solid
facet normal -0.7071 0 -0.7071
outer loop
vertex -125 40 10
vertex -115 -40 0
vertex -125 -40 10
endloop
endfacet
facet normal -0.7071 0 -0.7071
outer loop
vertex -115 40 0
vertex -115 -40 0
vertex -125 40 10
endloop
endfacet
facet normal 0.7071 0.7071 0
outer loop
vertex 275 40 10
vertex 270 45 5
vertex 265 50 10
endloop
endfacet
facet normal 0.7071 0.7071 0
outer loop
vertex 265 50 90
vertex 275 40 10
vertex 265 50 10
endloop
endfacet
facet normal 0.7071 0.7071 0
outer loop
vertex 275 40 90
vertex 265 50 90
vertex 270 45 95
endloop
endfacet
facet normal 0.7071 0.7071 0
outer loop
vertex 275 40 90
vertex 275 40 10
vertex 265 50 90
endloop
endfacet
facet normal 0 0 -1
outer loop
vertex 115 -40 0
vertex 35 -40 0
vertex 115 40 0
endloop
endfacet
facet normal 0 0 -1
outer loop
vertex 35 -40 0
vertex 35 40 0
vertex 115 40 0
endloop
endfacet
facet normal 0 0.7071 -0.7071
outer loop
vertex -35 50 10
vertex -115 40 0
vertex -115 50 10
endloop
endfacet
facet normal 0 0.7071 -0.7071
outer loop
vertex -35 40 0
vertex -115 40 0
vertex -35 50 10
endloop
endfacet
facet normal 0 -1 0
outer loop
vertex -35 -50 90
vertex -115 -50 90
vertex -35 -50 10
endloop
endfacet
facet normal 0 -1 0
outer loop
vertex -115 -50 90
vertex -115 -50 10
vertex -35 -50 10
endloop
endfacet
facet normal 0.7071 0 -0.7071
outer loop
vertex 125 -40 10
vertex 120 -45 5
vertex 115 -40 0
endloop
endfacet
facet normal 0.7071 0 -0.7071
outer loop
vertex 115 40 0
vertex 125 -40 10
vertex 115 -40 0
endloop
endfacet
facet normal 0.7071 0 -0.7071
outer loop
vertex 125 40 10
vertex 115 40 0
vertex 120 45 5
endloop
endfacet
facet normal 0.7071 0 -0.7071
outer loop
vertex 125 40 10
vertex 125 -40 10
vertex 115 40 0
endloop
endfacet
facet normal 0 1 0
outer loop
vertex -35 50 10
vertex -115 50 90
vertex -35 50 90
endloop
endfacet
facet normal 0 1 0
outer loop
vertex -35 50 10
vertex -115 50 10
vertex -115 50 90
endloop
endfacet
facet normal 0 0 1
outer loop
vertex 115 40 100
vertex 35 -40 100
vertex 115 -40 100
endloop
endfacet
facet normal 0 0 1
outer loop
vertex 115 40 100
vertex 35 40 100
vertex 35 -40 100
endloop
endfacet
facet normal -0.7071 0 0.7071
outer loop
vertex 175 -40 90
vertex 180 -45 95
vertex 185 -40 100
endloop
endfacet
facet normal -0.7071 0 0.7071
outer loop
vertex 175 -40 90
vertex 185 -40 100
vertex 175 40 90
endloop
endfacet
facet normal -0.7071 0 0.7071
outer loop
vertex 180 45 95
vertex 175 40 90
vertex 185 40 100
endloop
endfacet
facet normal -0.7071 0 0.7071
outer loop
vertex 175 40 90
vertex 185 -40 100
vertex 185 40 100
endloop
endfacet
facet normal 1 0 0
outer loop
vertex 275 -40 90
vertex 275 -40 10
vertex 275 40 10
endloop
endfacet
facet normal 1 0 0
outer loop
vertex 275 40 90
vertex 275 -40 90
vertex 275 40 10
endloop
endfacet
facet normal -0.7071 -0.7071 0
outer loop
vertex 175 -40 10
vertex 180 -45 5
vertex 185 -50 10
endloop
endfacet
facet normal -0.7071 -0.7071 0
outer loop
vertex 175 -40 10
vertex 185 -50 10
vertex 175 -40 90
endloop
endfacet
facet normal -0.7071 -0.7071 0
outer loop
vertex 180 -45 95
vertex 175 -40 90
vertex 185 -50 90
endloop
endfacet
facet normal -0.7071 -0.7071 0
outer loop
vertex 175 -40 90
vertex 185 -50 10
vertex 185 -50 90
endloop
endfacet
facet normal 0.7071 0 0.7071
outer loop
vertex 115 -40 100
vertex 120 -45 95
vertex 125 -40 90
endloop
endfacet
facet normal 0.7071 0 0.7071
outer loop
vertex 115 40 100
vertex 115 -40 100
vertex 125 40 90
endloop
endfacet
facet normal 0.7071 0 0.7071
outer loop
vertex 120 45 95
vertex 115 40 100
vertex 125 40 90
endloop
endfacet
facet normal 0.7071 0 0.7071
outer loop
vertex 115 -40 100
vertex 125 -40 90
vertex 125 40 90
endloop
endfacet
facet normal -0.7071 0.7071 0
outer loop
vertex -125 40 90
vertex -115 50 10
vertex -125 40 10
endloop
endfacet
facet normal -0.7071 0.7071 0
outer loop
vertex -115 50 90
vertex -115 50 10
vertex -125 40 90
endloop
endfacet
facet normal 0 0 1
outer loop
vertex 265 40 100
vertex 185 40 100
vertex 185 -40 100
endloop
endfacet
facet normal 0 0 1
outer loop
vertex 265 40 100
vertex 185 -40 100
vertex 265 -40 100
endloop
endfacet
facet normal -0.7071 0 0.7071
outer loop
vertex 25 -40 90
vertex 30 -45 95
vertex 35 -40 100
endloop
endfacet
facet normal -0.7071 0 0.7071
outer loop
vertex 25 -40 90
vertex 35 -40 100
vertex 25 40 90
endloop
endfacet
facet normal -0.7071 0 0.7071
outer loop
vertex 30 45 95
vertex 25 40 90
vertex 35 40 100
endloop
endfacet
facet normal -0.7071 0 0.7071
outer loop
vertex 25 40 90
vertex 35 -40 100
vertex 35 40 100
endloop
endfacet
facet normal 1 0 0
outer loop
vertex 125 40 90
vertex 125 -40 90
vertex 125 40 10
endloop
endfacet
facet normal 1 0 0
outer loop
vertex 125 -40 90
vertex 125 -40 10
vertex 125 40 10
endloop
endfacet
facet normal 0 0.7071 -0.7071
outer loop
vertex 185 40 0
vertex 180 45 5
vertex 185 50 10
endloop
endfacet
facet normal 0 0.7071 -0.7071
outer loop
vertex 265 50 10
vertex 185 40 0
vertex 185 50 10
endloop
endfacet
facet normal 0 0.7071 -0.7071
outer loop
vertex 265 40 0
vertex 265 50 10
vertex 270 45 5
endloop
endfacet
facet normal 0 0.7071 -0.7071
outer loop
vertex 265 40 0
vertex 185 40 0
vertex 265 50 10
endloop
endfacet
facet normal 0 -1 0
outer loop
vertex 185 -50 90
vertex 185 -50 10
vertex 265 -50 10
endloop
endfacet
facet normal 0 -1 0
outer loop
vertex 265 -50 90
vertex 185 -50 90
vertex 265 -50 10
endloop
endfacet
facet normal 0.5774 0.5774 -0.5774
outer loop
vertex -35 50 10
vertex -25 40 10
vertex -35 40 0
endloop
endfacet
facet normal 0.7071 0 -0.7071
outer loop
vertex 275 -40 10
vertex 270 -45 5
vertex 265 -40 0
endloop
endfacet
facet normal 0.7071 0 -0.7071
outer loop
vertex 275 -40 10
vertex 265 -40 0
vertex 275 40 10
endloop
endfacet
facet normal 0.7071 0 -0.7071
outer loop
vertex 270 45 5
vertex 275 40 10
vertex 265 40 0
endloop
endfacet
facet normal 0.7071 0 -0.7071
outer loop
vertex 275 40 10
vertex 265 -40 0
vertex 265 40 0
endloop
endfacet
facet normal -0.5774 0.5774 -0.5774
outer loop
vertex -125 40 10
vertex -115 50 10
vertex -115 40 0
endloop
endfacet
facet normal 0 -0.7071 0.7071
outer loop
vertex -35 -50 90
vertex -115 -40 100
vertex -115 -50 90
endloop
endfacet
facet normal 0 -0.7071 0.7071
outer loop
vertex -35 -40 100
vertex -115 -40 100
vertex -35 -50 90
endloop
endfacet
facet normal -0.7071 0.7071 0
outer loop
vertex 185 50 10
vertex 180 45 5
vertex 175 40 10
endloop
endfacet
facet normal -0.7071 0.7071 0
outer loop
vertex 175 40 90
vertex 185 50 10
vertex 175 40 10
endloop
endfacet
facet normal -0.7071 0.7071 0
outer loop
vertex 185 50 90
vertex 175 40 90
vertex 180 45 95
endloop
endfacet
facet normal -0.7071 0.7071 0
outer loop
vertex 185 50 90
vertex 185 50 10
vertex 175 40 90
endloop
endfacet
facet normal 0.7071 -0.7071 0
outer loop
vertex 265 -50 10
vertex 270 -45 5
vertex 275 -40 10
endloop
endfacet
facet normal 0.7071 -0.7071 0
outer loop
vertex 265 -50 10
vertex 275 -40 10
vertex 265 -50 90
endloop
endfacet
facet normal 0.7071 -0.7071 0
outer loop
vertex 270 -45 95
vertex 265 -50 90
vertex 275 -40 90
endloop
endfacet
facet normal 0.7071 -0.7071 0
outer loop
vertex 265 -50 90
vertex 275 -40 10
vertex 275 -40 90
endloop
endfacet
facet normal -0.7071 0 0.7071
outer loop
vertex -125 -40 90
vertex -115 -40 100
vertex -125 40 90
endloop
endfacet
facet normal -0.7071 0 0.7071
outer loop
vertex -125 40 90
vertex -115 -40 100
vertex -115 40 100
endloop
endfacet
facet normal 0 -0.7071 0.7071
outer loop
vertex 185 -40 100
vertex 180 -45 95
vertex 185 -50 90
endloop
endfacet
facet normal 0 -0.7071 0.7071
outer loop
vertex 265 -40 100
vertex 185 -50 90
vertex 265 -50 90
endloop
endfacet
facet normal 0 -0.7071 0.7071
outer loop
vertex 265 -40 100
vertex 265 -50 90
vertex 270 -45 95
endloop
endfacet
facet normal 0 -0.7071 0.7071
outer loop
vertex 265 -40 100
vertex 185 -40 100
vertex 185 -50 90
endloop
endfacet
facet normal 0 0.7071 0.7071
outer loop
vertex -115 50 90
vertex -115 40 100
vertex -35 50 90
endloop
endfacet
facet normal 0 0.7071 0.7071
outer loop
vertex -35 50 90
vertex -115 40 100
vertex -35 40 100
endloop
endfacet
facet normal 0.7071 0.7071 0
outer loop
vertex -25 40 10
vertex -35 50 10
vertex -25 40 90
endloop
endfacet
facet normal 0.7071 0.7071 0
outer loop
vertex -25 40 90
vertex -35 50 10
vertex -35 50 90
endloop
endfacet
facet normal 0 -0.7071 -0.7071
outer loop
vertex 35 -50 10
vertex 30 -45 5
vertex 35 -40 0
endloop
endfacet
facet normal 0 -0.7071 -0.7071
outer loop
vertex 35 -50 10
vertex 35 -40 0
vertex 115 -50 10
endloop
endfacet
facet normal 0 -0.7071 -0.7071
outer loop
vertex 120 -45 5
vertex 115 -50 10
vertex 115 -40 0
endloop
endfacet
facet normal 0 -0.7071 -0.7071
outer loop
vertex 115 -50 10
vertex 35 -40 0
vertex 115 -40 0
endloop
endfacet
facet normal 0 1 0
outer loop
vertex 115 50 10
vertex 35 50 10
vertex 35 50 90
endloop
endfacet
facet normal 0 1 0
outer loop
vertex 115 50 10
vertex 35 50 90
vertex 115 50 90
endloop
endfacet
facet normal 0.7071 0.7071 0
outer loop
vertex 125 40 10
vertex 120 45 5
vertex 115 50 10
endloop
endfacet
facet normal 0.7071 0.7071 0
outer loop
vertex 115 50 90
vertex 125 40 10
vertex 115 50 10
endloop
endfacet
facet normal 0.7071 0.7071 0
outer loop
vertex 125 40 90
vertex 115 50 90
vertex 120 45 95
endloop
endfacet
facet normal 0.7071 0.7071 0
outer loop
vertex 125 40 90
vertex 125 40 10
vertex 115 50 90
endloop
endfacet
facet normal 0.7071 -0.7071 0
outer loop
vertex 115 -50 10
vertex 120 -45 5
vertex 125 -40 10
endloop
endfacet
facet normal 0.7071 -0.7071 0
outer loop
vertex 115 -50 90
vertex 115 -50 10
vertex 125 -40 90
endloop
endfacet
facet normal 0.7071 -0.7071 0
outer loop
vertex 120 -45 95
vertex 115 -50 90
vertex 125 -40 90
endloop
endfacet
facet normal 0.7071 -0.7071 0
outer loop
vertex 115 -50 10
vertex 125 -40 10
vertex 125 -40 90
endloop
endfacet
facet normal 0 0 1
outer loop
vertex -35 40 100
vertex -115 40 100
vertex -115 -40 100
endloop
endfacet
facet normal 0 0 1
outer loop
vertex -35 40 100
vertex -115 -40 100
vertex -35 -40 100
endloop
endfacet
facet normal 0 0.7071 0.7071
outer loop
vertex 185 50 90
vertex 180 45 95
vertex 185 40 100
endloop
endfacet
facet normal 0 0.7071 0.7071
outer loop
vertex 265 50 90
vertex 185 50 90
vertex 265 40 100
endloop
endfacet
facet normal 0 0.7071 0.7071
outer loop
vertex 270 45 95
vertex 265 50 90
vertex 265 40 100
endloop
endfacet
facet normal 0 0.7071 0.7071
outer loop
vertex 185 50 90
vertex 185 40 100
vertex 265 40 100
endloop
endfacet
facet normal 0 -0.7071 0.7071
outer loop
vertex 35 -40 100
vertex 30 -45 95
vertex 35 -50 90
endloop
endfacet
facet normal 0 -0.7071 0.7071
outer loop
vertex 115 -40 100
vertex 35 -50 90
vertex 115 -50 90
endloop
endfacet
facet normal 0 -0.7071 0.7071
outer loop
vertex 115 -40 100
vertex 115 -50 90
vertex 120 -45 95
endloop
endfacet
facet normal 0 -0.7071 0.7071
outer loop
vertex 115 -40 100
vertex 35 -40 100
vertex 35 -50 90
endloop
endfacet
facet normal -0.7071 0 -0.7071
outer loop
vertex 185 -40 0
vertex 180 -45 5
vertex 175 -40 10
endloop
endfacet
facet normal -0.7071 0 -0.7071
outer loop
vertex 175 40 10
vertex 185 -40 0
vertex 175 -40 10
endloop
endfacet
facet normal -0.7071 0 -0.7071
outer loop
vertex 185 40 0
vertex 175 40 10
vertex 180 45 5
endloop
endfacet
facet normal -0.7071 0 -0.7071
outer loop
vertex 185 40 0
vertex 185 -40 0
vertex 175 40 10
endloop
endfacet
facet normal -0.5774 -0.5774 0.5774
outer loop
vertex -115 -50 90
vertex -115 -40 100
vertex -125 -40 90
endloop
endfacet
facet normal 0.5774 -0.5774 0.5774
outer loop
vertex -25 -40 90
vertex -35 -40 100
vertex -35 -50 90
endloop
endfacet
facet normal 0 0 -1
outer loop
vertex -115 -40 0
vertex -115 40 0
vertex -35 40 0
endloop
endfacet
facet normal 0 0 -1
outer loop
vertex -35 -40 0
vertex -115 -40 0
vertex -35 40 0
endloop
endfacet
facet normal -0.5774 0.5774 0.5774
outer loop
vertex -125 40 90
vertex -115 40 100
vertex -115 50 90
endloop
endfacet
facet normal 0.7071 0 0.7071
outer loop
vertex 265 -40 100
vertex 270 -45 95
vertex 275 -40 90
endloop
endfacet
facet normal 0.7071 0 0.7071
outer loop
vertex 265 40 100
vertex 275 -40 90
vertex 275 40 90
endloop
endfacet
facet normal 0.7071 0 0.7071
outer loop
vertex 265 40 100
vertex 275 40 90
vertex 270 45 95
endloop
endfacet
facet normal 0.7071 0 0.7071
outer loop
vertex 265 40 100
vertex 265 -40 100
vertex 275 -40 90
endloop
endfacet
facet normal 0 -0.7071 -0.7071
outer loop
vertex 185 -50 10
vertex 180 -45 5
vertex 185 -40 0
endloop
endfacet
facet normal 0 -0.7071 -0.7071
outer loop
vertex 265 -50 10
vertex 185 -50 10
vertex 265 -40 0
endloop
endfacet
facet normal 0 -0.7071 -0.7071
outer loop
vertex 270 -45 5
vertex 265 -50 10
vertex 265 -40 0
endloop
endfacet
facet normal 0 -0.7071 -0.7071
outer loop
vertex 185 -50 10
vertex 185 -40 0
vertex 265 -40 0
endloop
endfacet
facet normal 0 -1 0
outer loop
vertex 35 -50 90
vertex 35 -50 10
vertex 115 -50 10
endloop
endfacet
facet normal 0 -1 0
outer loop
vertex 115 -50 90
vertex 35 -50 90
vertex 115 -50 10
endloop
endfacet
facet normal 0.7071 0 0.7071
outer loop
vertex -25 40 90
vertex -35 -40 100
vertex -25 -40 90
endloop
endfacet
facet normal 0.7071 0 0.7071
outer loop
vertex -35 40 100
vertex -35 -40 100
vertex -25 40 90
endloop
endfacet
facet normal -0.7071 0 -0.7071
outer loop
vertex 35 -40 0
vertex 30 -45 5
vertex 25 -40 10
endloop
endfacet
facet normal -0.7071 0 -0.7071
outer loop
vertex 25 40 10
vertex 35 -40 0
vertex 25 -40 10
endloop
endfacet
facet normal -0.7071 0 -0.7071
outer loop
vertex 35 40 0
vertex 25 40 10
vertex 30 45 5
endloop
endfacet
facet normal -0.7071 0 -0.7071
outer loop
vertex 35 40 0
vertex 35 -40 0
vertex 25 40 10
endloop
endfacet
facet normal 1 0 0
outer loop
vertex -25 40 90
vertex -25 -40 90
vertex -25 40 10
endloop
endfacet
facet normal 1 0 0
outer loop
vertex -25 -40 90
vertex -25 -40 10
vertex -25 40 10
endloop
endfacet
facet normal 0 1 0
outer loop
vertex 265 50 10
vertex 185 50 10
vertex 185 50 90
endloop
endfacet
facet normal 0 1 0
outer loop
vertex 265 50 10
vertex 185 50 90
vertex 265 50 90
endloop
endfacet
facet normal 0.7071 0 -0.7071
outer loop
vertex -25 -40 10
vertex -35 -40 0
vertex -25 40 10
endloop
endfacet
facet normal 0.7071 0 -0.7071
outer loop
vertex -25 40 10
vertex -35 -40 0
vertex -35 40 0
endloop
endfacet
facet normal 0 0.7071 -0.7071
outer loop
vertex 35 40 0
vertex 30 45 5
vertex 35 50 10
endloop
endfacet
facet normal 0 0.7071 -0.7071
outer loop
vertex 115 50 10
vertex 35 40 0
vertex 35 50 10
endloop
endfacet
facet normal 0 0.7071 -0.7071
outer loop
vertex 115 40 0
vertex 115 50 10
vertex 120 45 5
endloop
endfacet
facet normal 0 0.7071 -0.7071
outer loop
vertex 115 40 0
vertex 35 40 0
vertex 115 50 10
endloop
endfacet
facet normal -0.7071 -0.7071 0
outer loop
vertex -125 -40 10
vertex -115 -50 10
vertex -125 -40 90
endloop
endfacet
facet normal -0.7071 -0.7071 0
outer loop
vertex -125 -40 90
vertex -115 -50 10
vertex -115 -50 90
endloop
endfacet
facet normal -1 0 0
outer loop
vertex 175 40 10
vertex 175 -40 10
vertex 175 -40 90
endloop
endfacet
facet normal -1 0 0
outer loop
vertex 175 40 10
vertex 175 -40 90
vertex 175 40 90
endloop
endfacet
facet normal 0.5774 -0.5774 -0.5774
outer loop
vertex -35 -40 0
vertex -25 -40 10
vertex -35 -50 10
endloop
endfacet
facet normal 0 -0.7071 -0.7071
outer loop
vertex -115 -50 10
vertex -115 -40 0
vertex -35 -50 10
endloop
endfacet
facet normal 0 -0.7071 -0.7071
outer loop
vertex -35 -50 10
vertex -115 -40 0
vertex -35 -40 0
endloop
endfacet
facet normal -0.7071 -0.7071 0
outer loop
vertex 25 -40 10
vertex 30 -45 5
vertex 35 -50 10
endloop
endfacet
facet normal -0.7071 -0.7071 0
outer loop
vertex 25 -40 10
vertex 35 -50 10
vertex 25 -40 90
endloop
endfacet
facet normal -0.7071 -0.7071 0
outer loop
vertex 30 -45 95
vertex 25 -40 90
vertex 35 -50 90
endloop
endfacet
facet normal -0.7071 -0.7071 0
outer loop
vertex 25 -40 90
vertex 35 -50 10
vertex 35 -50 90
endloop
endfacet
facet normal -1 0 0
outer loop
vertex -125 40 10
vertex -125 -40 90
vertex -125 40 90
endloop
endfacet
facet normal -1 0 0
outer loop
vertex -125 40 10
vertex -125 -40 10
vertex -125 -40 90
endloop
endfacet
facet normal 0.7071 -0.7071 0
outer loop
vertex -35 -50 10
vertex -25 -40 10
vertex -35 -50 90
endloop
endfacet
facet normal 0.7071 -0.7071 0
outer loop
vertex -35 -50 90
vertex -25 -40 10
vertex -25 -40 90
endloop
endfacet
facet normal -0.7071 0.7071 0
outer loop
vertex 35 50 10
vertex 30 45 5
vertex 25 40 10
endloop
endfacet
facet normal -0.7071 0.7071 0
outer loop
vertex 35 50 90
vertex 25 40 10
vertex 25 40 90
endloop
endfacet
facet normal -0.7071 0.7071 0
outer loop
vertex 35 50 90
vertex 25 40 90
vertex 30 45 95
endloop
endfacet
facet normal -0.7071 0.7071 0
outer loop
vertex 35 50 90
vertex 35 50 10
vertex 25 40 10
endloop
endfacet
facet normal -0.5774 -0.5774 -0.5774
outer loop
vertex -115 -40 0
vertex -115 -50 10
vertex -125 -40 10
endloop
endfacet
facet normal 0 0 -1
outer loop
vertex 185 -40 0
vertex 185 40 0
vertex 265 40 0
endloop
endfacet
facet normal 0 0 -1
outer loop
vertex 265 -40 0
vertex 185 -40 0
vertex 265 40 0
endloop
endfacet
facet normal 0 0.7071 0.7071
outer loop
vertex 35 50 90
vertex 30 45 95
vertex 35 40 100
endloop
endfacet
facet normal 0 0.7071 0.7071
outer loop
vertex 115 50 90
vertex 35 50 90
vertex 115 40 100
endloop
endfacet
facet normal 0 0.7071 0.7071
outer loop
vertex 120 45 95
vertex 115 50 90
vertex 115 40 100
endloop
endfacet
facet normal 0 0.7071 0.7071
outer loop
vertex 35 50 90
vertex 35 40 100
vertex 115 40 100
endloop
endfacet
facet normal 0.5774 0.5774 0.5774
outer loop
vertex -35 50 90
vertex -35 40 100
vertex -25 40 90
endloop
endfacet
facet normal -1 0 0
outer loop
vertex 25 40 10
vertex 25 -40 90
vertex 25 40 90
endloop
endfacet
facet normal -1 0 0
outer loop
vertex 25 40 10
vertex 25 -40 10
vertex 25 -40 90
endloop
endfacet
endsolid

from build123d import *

# Parameters (mm, degrees)
F0_W     = 100
F0_H     = 100
F1_DEPTH = 100
F2_SIZE  = 10
F3_SIZE  = 10
F4_SIZE  = 10
F5_SIZE  = 10
F6_SIZE  = 10
F7_SIZE  = 10


with BuildPart() as f1:
    # F0 (on Top) → F1 (new body)
    with BuildSketch(Plane.XY):
        with Locations((-75, 0)):
            Rectangle(F0_W, F0_H)
        with Locations((75, 0)):
            Rectangle(F0_W, F0_H)
        with Locations((225, 0)):
            Rectangle(F0_W, F0_H)
    extrude(amount=F1_DEPTH)

    # F2
    f2_edges = [f1.edges().sort_by_distance(p)[0] for p in [
        (-75, 50, 100),
        (-125, 0, 100),
        (-75, -50, 100),
        (-25, 0, 100),
        (-25, -50, 50),
        (-25, 50, 50),
        (-25, 0, 0),
        (-125, -50, 50),
        (-75, -50, 0),
        (-125, 50, 50),
        (-75, 50, 0),
        (-125, 0, 0),
    ]]
    chamfer(f2_edges, length=F2_SIZE)

    # F3
    f3_edges = [f1.edges().sort_by_distance(p)[0] for p in [
        (75, -50, 100),
        (75, 50, 100),
        (75, -50, 0),
        (75, 50, 0),
    ]]
    chamfer(f3_edges, length=F3_SIZE)

    # F4
    f4_edges = [f1.edges().sort_by_distance(p)[0] for p in [
        (25, 0, 100),
        (125, 0, 100),
        (125, 0, 0),
        (25, 0, 0),
    ]]
    chamfer(f4_edges, length=F4_SIZE)

    # F5
    f5_edges = [f1.edges().sort_by_distance(p)[0] for p in [
        (25, 50, 50),
        (25, -50, 50),
        (125, -50, 50),
        (125, 50, 50),
    ]]
    chamfer(f5_edges, length=F5_SIZE)

    # F6
    f6_edges = [f1.edges().sort_by_distance(p)[0] for p in [
        (225, 50, 100),
        (175, 0, 100),
        (225, -50, 100),
        (275, 0, 100),
        (225, 50, 0),
        (175, 0, 0),
        (225, -50, 0),
        (275, 0, 0),
    ]]
    chamfer(f6_edges, length=F6_SIZE)

    # F7
    f7_edges = [f1.edges().sort_by_distance(p)[0] for p in [
        (275, -50, 50),
        (175, -50, 50),
        (175, 50, 50),
        (275, 50, 50),
    ]]
    chamfer(f7_edges, length=F7_SIZE)


solid = f1.part
